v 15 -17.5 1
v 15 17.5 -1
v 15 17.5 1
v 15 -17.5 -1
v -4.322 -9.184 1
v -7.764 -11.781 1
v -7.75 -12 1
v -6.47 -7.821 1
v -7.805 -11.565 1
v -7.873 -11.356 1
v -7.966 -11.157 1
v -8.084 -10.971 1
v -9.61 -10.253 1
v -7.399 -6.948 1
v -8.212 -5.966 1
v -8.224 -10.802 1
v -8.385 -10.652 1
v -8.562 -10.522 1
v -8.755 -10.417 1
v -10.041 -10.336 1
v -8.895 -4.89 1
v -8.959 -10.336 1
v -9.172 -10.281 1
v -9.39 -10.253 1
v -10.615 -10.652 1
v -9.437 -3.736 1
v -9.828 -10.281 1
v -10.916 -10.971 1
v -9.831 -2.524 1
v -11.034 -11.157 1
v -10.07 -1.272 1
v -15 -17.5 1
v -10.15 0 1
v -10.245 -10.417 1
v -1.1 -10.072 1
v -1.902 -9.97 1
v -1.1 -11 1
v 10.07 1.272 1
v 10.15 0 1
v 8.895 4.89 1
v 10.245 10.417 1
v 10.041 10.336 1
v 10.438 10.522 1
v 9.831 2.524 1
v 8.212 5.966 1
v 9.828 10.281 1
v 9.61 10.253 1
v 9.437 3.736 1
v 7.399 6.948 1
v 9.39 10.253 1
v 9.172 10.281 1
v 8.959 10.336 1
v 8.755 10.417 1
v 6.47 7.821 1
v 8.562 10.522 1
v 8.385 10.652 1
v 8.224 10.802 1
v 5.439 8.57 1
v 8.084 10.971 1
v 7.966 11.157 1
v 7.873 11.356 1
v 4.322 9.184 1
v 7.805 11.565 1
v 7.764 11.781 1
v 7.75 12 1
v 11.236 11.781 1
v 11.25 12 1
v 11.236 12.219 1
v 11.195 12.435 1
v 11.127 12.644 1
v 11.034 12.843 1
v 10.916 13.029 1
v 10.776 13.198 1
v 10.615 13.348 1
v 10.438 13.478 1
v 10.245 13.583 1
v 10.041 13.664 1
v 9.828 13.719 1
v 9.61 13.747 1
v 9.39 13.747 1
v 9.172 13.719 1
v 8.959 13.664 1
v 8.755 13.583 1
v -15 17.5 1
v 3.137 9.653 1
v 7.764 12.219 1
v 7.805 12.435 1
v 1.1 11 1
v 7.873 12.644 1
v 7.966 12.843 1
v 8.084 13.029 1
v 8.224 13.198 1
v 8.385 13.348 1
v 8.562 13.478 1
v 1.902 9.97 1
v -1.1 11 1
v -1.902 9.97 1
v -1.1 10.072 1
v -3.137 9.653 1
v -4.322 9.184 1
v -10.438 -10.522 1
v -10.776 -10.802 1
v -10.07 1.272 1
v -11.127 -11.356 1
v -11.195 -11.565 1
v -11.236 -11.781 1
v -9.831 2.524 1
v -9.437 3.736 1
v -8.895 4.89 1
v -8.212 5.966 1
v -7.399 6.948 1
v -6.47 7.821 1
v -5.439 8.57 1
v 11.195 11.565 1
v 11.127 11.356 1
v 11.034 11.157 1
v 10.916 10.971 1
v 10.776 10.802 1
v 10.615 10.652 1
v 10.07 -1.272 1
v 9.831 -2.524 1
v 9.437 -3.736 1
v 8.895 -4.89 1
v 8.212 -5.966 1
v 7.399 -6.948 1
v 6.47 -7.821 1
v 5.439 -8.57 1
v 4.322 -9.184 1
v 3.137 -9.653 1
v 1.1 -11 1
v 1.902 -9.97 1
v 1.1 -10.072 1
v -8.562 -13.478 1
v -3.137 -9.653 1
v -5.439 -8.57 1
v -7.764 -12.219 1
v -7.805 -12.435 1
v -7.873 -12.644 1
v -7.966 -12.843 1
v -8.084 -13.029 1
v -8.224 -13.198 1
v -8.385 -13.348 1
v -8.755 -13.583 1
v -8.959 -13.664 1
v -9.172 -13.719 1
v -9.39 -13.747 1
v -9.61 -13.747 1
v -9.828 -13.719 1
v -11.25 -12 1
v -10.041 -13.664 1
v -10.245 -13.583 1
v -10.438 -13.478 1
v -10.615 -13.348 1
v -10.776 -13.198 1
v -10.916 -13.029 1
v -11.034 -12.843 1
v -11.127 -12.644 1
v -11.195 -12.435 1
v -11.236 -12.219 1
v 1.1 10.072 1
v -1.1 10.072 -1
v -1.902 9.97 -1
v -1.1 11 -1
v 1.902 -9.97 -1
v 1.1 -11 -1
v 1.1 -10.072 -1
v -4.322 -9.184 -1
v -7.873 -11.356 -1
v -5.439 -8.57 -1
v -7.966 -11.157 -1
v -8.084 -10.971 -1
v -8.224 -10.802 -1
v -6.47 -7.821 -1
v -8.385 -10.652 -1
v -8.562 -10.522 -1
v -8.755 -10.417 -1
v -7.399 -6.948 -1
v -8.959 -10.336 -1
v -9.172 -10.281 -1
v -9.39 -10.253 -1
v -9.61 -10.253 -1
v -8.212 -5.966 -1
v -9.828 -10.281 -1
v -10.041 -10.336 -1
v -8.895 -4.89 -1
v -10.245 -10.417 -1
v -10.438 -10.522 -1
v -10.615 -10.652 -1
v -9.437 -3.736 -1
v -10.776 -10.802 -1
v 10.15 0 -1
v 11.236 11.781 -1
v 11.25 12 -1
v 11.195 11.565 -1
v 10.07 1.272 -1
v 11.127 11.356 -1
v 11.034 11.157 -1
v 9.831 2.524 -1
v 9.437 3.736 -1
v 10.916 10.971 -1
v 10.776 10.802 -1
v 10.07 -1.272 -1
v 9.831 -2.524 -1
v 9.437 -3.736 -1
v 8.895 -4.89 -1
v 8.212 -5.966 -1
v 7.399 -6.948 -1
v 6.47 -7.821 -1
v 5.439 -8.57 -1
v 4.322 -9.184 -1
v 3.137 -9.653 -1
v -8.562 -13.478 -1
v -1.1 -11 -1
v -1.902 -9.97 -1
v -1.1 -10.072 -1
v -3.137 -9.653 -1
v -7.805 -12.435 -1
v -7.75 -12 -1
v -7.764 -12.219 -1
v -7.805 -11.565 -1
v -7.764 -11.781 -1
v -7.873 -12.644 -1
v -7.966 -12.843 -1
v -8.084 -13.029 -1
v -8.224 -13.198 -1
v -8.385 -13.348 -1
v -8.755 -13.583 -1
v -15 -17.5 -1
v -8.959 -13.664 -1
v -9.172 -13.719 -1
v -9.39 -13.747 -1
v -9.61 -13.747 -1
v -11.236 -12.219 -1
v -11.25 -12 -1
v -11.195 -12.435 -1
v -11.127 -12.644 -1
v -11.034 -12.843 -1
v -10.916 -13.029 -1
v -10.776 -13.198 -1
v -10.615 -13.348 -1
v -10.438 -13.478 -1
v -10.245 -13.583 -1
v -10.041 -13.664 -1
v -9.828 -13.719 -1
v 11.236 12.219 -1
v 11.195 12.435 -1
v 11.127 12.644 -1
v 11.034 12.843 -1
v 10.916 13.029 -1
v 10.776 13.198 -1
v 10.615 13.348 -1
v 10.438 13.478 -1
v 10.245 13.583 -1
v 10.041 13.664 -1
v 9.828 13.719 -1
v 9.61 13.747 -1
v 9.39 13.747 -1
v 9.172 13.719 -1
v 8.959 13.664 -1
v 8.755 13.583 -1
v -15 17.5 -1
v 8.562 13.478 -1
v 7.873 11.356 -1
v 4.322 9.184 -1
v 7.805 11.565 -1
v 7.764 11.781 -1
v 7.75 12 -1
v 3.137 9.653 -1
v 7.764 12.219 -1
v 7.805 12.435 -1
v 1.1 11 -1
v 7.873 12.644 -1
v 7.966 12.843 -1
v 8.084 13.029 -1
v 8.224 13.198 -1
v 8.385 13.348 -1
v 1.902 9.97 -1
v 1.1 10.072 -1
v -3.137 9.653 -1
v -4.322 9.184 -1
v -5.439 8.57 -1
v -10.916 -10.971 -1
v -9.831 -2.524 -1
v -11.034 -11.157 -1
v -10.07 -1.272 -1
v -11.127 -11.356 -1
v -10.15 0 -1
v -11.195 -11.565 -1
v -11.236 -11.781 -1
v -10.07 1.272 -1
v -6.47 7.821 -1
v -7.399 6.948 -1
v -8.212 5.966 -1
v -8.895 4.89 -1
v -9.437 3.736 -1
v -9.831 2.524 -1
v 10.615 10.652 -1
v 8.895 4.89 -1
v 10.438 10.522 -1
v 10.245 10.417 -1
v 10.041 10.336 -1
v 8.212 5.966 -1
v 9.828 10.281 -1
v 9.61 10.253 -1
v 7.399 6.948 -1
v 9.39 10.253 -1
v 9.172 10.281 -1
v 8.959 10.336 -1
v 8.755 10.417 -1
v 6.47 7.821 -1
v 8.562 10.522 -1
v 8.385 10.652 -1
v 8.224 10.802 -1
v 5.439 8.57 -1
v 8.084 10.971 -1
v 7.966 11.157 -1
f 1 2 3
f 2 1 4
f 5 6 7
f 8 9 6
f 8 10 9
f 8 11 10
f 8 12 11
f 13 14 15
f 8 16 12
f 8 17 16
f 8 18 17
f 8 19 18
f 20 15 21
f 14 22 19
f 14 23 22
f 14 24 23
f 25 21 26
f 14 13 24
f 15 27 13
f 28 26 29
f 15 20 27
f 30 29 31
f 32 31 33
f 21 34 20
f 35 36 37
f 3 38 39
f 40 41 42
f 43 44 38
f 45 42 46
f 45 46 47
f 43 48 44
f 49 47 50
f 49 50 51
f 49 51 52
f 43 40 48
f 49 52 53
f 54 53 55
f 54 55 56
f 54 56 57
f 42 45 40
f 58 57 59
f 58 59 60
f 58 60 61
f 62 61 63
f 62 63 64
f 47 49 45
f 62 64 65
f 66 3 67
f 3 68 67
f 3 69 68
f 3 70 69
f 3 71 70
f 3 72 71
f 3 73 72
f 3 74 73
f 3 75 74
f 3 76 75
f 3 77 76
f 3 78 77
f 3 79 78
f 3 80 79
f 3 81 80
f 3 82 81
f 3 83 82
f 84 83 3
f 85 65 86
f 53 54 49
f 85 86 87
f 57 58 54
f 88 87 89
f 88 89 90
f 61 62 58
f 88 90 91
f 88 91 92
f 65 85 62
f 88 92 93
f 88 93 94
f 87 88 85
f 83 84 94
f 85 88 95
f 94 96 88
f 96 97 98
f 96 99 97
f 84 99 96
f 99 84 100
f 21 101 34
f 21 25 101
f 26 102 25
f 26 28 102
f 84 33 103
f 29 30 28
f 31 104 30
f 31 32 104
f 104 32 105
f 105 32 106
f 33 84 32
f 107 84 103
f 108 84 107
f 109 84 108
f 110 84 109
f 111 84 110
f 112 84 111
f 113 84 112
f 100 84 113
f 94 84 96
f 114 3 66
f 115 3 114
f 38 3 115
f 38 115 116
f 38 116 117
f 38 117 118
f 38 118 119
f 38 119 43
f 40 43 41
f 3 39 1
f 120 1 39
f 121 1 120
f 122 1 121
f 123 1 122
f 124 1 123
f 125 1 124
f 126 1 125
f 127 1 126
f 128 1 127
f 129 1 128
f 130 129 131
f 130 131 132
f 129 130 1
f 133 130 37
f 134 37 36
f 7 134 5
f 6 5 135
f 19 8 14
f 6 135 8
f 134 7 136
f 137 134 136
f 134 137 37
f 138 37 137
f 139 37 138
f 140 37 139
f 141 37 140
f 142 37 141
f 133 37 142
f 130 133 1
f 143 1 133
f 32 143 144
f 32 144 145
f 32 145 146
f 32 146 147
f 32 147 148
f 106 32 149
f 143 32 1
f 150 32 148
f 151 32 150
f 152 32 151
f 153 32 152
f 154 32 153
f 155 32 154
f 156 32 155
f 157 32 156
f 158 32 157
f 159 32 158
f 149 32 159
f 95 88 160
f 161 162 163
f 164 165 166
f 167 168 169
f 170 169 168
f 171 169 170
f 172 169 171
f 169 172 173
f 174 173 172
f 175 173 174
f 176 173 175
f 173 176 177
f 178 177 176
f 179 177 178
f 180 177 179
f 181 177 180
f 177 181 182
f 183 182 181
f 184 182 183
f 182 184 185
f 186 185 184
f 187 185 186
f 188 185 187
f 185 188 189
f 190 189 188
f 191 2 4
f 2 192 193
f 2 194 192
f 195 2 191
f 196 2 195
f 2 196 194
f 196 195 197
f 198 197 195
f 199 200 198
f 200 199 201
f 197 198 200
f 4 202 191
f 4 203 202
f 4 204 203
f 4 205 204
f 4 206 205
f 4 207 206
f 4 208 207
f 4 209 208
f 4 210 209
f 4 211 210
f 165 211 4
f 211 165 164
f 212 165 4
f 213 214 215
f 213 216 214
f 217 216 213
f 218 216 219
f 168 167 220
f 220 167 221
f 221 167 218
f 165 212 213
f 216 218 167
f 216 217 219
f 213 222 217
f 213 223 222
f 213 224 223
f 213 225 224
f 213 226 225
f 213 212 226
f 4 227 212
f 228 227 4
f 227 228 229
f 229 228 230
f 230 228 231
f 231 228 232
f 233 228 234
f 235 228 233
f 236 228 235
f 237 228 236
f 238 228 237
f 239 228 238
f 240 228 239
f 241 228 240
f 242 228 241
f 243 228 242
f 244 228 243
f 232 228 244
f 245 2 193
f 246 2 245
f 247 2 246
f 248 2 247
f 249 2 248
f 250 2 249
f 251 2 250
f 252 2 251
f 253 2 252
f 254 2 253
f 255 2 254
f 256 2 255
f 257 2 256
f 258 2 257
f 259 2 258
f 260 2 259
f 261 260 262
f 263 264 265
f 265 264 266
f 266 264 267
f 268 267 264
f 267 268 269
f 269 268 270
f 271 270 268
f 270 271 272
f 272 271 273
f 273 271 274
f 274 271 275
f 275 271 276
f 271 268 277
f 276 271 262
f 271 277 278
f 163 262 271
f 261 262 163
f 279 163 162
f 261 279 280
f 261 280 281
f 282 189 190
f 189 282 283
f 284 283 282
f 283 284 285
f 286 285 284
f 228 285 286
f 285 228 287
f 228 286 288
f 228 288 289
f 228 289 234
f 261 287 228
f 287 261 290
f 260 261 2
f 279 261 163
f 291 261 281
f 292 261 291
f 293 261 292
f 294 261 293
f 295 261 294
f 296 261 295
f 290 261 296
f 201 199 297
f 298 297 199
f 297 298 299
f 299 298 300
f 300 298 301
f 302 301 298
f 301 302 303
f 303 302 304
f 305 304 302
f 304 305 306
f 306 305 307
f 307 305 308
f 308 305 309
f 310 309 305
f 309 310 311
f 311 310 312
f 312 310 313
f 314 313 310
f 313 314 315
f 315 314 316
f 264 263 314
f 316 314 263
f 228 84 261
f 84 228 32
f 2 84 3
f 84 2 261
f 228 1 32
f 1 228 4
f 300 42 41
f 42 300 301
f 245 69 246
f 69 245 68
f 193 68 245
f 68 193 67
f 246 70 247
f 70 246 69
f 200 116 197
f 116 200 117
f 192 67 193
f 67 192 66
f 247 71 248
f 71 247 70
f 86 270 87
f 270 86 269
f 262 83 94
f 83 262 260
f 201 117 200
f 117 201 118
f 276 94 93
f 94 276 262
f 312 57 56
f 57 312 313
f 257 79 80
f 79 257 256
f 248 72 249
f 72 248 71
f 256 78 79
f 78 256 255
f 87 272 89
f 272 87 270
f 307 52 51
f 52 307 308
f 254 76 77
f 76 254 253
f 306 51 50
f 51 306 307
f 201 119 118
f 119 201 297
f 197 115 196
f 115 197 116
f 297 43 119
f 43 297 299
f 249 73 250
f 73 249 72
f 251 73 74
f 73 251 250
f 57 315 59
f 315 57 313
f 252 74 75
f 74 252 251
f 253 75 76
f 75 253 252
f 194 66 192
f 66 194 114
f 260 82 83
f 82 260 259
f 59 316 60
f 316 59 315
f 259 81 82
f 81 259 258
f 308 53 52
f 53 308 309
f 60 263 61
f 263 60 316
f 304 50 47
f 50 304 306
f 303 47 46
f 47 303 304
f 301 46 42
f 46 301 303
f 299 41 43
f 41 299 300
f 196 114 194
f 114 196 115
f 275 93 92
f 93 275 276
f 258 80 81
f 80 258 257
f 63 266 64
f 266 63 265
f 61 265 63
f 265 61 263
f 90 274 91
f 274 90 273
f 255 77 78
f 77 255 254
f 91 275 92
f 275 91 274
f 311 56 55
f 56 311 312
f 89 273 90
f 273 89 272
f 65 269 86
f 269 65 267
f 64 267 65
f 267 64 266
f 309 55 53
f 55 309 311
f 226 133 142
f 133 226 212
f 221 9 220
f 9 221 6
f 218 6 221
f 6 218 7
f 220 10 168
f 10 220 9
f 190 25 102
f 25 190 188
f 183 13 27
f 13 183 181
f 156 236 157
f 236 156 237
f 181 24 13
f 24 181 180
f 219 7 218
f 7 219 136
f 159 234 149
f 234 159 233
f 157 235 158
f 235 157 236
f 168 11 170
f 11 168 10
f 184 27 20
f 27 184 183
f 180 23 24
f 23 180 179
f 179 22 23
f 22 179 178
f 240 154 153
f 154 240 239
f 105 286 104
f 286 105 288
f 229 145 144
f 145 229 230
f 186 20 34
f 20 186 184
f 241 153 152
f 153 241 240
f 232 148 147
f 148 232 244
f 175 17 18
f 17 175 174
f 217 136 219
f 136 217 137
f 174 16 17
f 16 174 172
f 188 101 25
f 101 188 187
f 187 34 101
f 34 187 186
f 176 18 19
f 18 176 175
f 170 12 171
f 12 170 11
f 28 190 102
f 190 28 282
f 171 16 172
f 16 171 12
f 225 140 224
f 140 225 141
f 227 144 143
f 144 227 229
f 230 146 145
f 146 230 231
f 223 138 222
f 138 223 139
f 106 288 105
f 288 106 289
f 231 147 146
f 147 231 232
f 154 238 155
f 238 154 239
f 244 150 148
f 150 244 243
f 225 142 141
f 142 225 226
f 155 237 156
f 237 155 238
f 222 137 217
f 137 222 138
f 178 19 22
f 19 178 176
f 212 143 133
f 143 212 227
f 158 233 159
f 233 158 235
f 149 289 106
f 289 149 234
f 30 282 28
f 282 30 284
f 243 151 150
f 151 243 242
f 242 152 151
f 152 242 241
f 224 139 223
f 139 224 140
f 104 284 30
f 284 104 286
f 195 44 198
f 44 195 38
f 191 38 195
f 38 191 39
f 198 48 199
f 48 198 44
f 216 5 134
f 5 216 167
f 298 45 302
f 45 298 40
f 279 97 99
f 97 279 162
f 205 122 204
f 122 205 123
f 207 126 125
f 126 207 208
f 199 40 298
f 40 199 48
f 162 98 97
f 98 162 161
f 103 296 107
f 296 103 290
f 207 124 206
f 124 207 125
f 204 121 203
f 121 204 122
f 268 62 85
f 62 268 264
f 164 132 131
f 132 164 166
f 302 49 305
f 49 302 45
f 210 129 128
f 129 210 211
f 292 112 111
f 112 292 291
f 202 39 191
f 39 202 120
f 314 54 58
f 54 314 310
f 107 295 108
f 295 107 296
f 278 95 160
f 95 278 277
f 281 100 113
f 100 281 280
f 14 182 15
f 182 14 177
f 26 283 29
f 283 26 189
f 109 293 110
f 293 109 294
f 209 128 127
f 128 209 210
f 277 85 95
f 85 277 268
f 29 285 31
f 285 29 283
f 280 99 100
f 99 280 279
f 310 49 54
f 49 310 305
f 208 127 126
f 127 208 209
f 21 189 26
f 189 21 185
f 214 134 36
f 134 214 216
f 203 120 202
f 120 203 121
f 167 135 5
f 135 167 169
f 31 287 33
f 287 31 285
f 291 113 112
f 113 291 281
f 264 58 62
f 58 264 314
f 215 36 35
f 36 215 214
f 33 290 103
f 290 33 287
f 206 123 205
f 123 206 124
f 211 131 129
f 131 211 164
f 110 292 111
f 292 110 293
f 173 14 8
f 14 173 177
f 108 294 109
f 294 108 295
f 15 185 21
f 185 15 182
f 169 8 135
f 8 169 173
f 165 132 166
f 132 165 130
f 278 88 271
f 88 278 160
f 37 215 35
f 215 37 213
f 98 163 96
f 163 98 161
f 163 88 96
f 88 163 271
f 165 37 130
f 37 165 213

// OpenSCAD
// file: roundedcube.scad
// More information: https://danielupshaw.com/openscad-rounded-corners/

// Set to 0.01 for higher definition curves (renders slower)
$fs = 0.15;

module roundedcube(size = [1, 1, 1], center = false, radius = 0.5, apply_to = "all") {
	// If single value, convert to [x, y, z] vector
	size = (size[0] == undef) ? [size, size, size] : size;

	translate_min = radius;
	translate_xmax = size[0] - radius;
	translate_ymax = size[1] - radius;
	translate_zmax = size[2] - radius;

	diameter = radius * 2;

	obj_translate = (center == false) ?
		[0, 0, 0] : [
			-(size[0] / 2),
			-(size[1] / 2),
			-(size[2] / 2)
		];

	translate(v = obj_translate) {
		hull() {
			for (translate_x = [translate_min, translate_xmax]) {
				x_at = (translate_x == translate_min) ? "min" : "max";
				for (translate_y = [translate_min, translate_ymax]) {
					y_at = (translate_y == translate_min) ? "min" : "max";
					for (translate_z = [translate_min, translate_zmax]) {
						z_at = (translate_z == translate_min) ? "min" : "max";

						translate(v = [translate_x, translate_y, translate_z])
						if (
							(apply_to == "all") ||
							(apply_to == "xmin" && x_at == "min") || (apply_to == "xmax" && x_at == "max") ||
							(apply_to == "ymin" && y_at == "min") || (apply_to == "ymax" && y_at == "max") ||
							(apply_to == "zmin" && z_at == "min") || (apply_to == "zmax" && z_at == "max")
						) {
							sphere(r = radius);
						} else {
							rotate = 
								(apply_to == "xmin" || apply_to == "xmax" || apply_to == "x") ? [0, 90, 0] : (
								(apply_to == "ymin" || apply_to == "ymax" || apply_to == "y") ? [90, 90, 0] :
								[0, 0, 0]
							);
							rotate(a = rotate)
							cylinder(h = diameter, r = radius, center = true);
						}
					}
				}
			}
		}
	}
}
// file: misc-neutrik-d-plate.scad
/* Copyright Brian Stephan 2023
 *
 * This file is part of the Buildable Stick System.
 *
 * The Buildable Stick System is free software: you can redistribute it and/or modify
 * it under the terms of the GNU General Public License as published by the
 * Free Software Foundation, either version 3 of the License, or (at your
 * option) any later version.
 *
 * The Buildable Stick System is distributed in the hope that it will be useful, but
 * WITHOUT ANY WARRANTY; without even the implied warranty of MERCHANTABILITY
 * or FITNESS FOR A PARTICULAR PURPOSE. See the GNU General Public License for
 * more details.
 *
 * You should have received a copy of the GNU General Public License along with
 * the Buildable Stick System. If not, see <https://www.gnu.org/licenses/>.
 */

include <parameters.scad>
include <components.scad>

module neutrik_d_plate() {
	difference() {
		cube([30, 35, 2], center=true);
		translate([9.5, 12, 0]) neutrik_d_screw_hole();
		translate([-9.5, -12, 0]) neutrik_d_screw_hole();
	}
}

neutrik_d_plate();
// file: parameters.scad
/* Copyright Brian Stephan 2023
 *
 * This file is part of the Buildable Stick System.
 *
 * The Buildable Stick System is free software: you can redistribute it and/or modify
 * it under the terms of the GNU General Public License as published by the
 * Free Software Foundation, either version 3 of the License, or (at your
 * option) any later version.
 *
 * The Buildable Stick System is distributed in the hope that it will be useful, but
 * WITHOUT ANY WARRANTY; without even the implied warranty of MERCHANTABILITY
 * or FITNESS FOR A PARTICULAR PURPOSE. See the GNU General Public License for
 * more details.
 *
 * You should have received a copy of the GNU General Public License along with
 * the Buildable Stick System. If not, see <https://www.gnu.org/licenses/>.
 */

// adjustments
hole_tolerance = 0.15;

// M2
m2_screw_selftap_radius = 0.95;

// M3
m3_screw_selftap_radius = 1.3;

// M4
m4_bolt_radius = 2 + hole_tolerance;
m4_bolt_countersink_radius = 6.1 + hole_tolerance;
m4_bolt_hex_exterior_radius = 3.6 + hole_tolerance;

// 24mm button
small_button_radius = 12 + hole_tolerance;

// 30mm button
big_button_radius = 15 + hole_tolerance;

// JLF mount dimensions
lever_mount_x = 53;
lever_mount_y = 95;
lever_mount_z = 2;

// standard lever hole
lever_plate_hole = 12;

// case dimensions
// base frame box. reminder: top of inside (including mounts) is chopped by top_plate_z for plates
frame_x = 233;
frame_y = 208;
frame_z = 50;

// depth of the "lip" of the frame that the top plate sets into/supports the overhang
frame_wall = 4;

// per neutrik (mm)
neutrik_panel_thickness = 3;

// top plate, which can either be the whole plate ("inset") or the mounting frame for a plate that overhangs
top_plate_x = frame_x - (frame_wall * 2);
top_plate_y = frame_y - (frame_wall * 2);
top_plate_z = 5;

// how much the top plate x/y is expanded to overhang the frame
// note that this is relative to the top plate (so the wall is added back)
top_plate_overhang_amount = 8.5;
overhang_top_plate_x = top_plate_x + (frame_wall * 2) + (top_plate_overhang_amount * 2);
overhang_top_plate_y = top_plate_y + (frame_wall * 2) + (top_plate_overhang_amount * 2);

plate_to_frame_point_x = (top_plate_x/2)-10;
plate_to_frame_point_y = (top_plate_y/2)-10;

// frame interior that supports the top plates
panel_support_width = 5;

// neutrik D screw holes
neutrik_d_screw_radius = 1.6 + hole_tolerance;
neutrik_d_radius = 12 + hole_tolerance;

// additional button radius for decorative panels, etc.
decorative_radius_scale = 1.75;
jumbo_decorative_radius_scale = 2;
// main file
/* Copyright Brian Stephan 2023
 *
 * This file is part of the Buildable Stick System.
 *
 * The Buildable Stick System is free software: you can redistribute it and/or modify
 * it under the terms of the GNU General Public License as published by the
 * Free Software Foundation, either version 3 of the License, or (at your
 * option) any later version.
 *
 * The Buildable Stick System is distributed in the hope that it will be useful, but
 * WITHOUT ANY WARRANTY; without even the implied warranty of MERCHANTABILITY
 * or FITNESS FOR A PARTICULAR PURPOSE. See the GNU General Public License for
 * more details.
 *
 * You should have received a copy of the GNU General Public License along with
 * the Buildable Stick System. If not, see <https://www.gnu.org/licenses/>.
 */

include <parameters.scad>
include <components.scad>
use <misc-neutrik-d-plate.scad>

module neutrik_d_plate_20mm() {
	difference() {
		neutrik_d_plate();
		cylinder(r=10+hole_tolerance, h=5, $fn=50, center=true);
		cube([2.2, 22, 5], center=true);
	}
}

neutrik_d_plate_20mm();
